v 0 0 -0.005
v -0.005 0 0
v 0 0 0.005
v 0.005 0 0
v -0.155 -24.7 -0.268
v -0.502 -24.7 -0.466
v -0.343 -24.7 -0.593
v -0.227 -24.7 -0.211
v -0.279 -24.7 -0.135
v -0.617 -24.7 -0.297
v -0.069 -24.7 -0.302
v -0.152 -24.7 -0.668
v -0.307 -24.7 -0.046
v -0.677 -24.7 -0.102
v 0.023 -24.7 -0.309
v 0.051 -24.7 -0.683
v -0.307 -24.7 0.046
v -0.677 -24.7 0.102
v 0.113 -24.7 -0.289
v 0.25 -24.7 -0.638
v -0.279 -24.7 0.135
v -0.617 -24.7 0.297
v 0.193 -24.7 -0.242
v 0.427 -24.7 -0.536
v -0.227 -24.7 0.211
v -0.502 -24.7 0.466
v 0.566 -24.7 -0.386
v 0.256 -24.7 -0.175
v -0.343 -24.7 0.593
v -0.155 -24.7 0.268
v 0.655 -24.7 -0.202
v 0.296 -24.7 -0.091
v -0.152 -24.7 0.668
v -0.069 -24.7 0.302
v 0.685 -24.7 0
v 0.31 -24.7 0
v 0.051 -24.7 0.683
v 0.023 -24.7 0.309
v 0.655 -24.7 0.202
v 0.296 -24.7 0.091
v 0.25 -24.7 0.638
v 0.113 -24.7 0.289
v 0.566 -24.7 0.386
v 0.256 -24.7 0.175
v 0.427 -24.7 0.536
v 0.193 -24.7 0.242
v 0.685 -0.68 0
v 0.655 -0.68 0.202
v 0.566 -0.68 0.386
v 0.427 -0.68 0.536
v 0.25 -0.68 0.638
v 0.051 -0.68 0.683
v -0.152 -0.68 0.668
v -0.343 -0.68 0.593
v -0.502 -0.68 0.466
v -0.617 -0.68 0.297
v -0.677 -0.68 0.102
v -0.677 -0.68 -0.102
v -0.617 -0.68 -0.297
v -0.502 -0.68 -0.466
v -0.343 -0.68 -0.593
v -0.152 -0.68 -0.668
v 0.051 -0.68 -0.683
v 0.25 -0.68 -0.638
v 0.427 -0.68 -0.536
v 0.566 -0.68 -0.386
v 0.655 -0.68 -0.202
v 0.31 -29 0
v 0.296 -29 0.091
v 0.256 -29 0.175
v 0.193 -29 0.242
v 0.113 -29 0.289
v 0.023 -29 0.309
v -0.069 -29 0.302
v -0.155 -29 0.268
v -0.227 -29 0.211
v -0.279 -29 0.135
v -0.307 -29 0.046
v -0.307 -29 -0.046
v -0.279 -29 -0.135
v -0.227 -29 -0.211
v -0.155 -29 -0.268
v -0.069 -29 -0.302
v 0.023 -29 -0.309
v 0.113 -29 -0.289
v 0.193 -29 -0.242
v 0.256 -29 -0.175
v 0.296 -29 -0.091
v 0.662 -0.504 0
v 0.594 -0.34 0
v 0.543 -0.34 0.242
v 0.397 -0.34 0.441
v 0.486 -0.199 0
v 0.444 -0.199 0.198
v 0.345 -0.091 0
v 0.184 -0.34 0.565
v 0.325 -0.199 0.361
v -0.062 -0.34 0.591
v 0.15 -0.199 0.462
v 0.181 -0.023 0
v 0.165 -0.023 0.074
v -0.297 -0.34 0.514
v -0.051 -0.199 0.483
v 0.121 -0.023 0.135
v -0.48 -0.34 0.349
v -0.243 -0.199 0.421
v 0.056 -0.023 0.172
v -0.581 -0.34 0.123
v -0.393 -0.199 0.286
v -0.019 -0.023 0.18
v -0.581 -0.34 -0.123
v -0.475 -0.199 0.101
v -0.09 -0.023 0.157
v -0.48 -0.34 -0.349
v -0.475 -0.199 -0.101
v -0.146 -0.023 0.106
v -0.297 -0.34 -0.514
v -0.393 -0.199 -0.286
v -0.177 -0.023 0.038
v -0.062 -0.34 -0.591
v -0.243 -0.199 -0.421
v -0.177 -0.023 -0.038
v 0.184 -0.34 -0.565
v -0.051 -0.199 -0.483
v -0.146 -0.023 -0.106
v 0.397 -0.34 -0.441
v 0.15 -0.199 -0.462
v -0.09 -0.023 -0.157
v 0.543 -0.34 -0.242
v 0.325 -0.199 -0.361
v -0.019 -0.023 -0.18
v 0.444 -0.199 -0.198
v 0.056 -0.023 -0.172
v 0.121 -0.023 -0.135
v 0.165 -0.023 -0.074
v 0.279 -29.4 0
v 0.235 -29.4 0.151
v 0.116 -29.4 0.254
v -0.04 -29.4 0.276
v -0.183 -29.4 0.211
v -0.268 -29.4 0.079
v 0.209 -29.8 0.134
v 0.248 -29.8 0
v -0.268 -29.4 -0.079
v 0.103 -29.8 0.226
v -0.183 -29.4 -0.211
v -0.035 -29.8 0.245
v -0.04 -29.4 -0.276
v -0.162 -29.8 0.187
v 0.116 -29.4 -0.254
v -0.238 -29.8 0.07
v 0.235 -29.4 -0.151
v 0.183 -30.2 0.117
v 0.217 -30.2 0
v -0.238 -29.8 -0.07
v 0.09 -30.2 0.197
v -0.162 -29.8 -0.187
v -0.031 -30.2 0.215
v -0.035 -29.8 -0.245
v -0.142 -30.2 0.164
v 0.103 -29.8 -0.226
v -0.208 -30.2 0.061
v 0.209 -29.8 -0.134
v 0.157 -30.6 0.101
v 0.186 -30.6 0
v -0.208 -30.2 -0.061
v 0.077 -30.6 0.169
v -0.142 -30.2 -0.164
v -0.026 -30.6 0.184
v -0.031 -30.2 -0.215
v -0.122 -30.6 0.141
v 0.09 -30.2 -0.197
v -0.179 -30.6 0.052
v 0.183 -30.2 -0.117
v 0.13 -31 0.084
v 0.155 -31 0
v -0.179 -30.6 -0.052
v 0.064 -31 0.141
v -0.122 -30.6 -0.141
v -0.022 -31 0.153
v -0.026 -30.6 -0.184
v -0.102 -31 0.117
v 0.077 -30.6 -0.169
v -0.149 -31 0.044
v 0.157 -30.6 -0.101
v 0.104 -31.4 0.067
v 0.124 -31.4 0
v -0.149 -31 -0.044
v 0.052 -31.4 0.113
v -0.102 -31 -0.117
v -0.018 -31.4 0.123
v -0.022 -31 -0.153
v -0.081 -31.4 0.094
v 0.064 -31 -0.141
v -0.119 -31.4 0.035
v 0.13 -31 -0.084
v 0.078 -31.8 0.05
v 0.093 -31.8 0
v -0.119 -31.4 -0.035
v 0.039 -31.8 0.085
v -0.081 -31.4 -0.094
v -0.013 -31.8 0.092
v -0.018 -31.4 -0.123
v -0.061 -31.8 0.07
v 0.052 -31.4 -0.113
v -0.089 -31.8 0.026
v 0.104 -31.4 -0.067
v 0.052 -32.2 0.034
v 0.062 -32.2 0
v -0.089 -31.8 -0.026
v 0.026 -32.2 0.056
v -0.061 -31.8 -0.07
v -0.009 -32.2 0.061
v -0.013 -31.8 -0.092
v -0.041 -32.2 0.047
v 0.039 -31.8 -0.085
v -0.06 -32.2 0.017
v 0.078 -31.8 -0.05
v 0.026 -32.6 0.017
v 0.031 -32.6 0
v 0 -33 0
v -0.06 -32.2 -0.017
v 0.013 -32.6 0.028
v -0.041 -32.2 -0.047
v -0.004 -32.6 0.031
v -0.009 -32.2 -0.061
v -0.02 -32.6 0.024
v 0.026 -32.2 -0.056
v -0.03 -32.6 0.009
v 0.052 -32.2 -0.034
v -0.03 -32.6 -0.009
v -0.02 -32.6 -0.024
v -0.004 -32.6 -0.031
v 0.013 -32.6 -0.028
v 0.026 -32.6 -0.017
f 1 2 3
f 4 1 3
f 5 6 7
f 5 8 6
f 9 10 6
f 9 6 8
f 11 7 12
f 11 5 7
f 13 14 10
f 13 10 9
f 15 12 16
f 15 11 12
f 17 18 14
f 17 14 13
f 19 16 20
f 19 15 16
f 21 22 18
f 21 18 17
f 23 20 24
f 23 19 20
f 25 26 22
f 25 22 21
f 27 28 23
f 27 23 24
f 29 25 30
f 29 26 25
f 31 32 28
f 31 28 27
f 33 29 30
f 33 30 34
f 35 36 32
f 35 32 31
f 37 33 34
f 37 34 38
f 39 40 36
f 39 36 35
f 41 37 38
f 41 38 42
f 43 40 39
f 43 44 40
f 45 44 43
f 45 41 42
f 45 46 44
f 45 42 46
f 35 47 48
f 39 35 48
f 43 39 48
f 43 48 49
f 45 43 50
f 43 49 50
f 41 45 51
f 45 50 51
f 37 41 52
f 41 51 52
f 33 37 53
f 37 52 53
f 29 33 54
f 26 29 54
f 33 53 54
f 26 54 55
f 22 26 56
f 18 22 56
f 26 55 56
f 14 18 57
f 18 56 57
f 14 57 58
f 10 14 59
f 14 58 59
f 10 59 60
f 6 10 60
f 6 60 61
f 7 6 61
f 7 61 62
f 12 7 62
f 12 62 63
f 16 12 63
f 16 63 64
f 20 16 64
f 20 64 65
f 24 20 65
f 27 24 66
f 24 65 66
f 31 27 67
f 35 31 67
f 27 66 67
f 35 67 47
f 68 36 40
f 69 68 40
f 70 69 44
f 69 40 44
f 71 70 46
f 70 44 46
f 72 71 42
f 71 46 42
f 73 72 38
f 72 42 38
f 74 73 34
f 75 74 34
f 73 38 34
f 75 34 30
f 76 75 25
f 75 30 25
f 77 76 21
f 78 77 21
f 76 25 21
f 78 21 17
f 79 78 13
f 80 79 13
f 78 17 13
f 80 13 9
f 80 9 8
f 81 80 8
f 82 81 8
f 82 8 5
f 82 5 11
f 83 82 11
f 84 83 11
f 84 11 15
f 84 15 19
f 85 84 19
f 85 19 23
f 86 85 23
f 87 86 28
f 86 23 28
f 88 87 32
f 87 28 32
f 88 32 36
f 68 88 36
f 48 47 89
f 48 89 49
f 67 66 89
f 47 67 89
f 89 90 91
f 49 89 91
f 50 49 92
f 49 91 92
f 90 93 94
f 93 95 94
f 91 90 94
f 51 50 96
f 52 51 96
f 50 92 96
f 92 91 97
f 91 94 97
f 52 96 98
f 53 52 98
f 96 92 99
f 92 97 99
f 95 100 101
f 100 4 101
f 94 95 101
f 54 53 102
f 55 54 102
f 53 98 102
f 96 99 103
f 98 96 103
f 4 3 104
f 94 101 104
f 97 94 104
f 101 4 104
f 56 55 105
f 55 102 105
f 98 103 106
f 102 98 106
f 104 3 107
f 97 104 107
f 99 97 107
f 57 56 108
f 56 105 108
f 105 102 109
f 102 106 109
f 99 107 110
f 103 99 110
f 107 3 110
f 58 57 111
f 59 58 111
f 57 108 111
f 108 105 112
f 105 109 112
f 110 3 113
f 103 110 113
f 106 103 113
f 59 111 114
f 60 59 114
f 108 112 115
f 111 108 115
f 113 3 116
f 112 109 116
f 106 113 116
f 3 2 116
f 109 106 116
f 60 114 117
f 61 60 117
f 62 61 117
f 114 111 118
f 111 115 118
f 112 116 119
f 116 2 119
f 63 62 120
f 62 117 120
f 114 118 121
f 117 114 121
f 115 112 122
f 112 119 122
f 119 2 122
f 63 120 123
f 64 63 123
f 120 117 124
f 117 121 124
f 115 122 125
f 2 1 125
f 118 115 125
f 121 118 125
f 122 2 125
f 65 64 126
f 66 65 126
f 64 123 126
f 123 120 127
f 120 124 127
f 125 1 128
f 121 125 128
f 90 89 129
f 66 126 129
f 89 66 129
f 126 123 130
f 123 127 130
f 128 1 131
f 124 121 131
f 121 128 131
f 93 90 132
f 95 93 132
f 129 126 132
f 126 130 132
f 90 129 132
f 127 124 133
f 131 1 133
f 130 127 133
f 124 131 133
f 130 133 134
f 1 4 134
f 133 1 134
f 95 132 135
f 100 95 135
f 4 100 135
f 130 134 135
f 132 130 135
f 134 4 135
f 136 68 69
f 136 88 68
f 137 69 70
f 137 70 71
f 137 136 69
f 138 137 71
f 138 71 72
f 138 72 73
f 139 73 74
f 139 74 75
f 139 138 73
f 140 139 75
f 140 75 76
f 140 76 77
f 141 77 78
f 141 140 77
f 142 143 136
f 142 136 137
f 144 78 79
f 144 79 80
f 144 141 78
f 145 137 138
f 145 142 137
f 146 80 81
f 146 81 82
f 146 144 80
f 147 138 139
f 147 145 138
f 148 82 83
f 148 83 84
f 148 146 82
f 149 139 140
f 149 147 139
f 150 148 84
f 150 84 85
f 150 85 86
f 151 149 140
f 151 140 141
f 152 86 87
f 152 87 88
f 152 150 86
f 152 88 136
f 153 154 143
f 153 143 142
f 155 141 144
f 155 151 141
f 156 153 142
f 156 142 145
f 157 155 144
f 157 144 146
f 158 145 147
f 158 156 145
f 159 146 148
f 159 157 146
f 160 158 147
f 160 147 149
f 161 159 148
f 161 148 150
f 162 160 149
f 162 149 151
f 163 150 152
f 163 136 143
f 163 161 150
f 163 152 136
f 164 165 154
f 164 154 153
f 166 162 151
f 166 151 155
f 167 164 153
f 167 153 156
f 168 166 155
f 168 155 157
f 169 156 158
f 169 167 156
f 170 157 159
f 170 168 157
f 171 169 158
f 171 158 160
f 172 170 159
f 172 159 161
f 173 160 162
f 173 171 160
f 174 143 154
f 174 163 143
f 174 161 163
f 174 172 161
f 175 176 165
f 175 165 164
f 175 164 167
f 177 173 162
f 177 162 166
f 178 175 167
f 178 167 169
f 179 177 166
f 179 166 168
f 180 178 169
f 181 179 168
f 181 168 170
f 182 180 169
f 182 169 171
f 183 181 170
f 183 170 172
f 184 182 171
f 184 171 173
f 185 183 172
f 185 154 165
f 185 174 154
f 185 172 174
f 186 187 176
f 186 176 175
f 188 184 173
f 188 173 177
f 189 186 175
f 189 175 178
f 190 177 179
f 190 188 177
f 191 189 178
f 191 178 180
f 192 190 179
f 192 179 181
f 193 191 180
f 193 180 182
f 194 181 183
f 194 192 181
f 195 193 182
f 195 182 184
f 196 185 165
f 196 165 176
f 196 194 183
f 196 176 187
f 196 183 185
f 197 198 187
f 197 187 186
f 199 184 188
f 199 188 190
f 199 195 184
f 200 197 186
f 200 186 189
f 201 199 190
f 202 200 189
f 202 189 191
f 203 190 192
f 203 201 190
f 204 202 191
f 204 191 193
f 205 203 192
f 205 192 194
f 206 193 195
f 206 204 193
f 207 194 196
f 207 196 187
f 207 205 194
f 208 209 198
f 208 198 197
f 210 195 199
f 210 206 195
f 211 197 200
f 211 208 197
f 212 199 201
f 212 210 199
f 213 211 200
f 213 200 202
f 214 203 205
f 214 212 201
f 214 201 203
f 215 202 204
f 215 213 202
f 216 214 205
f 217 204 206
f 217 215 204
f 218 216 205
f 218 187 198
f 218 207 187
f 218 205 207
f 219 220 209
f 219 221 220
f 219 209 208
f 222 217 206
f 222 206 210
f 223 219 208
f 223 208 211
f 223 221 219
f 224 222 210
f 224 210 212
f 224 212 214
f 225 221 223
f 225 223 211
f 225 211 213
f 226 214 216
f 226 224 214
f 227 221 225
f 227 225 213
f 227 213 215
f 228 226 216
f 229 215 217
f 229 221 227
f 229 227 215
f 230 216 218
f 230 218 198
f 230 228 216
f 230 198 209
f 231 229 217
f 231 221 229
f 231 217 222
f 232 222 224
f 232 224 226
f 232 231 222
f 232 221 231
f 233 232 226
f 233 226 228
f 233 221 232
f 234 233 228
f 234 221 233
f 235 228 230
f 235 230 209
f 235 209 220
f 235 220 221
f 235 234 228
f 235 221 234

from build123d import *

# Parameters (mm, degrees)
SKETCH_R      = 0.685
PAD_DEPTH     = 24.7
FILLET_R      = 0.68
SKETCH001_R   = 0.31
PAD001_DEPTH  = 8.3
CHAMFER_ANGLE = 4.43
CHAMFER_SIZE  = 4


with BuildPart() as part:
    # Sketch → Pad (new body)
    with BuildSketch(Plane.XZ):
        Circle(SKETCH_R)
    extrude(amount=PAD_DEPTH)

    # Fillet
    fillet_edges = [part.edges().sort_by_distance(p)[0] for p in [
        (-0.685, 0, 0),
    ]]
    fillet(fillet_edges, radius=FILLET_R)

    # Sketch001 (on Face3 of Fillet) → Pad001 (join)
    with BuildSketch(Plane.XZ.offset(24.7)):
        Circle(SKETCH001_R)
    extrude(amount=PAD001_DEPTH)

    # Chamfer
    chamfer_edges = [part.edges().sort_by_distance(p)[0] for p in [
        (-0.31, -33, 0),
    ]]
    chamfer_side = part.faces().sort_by_distance((-0.31, -28.85, 0))[0]
    chamfer(chamfer_edges, length=CHAMFER_SIZE, angle=CHAMFER_ANGLE, reference=chamfer_side)


solid = part.part
